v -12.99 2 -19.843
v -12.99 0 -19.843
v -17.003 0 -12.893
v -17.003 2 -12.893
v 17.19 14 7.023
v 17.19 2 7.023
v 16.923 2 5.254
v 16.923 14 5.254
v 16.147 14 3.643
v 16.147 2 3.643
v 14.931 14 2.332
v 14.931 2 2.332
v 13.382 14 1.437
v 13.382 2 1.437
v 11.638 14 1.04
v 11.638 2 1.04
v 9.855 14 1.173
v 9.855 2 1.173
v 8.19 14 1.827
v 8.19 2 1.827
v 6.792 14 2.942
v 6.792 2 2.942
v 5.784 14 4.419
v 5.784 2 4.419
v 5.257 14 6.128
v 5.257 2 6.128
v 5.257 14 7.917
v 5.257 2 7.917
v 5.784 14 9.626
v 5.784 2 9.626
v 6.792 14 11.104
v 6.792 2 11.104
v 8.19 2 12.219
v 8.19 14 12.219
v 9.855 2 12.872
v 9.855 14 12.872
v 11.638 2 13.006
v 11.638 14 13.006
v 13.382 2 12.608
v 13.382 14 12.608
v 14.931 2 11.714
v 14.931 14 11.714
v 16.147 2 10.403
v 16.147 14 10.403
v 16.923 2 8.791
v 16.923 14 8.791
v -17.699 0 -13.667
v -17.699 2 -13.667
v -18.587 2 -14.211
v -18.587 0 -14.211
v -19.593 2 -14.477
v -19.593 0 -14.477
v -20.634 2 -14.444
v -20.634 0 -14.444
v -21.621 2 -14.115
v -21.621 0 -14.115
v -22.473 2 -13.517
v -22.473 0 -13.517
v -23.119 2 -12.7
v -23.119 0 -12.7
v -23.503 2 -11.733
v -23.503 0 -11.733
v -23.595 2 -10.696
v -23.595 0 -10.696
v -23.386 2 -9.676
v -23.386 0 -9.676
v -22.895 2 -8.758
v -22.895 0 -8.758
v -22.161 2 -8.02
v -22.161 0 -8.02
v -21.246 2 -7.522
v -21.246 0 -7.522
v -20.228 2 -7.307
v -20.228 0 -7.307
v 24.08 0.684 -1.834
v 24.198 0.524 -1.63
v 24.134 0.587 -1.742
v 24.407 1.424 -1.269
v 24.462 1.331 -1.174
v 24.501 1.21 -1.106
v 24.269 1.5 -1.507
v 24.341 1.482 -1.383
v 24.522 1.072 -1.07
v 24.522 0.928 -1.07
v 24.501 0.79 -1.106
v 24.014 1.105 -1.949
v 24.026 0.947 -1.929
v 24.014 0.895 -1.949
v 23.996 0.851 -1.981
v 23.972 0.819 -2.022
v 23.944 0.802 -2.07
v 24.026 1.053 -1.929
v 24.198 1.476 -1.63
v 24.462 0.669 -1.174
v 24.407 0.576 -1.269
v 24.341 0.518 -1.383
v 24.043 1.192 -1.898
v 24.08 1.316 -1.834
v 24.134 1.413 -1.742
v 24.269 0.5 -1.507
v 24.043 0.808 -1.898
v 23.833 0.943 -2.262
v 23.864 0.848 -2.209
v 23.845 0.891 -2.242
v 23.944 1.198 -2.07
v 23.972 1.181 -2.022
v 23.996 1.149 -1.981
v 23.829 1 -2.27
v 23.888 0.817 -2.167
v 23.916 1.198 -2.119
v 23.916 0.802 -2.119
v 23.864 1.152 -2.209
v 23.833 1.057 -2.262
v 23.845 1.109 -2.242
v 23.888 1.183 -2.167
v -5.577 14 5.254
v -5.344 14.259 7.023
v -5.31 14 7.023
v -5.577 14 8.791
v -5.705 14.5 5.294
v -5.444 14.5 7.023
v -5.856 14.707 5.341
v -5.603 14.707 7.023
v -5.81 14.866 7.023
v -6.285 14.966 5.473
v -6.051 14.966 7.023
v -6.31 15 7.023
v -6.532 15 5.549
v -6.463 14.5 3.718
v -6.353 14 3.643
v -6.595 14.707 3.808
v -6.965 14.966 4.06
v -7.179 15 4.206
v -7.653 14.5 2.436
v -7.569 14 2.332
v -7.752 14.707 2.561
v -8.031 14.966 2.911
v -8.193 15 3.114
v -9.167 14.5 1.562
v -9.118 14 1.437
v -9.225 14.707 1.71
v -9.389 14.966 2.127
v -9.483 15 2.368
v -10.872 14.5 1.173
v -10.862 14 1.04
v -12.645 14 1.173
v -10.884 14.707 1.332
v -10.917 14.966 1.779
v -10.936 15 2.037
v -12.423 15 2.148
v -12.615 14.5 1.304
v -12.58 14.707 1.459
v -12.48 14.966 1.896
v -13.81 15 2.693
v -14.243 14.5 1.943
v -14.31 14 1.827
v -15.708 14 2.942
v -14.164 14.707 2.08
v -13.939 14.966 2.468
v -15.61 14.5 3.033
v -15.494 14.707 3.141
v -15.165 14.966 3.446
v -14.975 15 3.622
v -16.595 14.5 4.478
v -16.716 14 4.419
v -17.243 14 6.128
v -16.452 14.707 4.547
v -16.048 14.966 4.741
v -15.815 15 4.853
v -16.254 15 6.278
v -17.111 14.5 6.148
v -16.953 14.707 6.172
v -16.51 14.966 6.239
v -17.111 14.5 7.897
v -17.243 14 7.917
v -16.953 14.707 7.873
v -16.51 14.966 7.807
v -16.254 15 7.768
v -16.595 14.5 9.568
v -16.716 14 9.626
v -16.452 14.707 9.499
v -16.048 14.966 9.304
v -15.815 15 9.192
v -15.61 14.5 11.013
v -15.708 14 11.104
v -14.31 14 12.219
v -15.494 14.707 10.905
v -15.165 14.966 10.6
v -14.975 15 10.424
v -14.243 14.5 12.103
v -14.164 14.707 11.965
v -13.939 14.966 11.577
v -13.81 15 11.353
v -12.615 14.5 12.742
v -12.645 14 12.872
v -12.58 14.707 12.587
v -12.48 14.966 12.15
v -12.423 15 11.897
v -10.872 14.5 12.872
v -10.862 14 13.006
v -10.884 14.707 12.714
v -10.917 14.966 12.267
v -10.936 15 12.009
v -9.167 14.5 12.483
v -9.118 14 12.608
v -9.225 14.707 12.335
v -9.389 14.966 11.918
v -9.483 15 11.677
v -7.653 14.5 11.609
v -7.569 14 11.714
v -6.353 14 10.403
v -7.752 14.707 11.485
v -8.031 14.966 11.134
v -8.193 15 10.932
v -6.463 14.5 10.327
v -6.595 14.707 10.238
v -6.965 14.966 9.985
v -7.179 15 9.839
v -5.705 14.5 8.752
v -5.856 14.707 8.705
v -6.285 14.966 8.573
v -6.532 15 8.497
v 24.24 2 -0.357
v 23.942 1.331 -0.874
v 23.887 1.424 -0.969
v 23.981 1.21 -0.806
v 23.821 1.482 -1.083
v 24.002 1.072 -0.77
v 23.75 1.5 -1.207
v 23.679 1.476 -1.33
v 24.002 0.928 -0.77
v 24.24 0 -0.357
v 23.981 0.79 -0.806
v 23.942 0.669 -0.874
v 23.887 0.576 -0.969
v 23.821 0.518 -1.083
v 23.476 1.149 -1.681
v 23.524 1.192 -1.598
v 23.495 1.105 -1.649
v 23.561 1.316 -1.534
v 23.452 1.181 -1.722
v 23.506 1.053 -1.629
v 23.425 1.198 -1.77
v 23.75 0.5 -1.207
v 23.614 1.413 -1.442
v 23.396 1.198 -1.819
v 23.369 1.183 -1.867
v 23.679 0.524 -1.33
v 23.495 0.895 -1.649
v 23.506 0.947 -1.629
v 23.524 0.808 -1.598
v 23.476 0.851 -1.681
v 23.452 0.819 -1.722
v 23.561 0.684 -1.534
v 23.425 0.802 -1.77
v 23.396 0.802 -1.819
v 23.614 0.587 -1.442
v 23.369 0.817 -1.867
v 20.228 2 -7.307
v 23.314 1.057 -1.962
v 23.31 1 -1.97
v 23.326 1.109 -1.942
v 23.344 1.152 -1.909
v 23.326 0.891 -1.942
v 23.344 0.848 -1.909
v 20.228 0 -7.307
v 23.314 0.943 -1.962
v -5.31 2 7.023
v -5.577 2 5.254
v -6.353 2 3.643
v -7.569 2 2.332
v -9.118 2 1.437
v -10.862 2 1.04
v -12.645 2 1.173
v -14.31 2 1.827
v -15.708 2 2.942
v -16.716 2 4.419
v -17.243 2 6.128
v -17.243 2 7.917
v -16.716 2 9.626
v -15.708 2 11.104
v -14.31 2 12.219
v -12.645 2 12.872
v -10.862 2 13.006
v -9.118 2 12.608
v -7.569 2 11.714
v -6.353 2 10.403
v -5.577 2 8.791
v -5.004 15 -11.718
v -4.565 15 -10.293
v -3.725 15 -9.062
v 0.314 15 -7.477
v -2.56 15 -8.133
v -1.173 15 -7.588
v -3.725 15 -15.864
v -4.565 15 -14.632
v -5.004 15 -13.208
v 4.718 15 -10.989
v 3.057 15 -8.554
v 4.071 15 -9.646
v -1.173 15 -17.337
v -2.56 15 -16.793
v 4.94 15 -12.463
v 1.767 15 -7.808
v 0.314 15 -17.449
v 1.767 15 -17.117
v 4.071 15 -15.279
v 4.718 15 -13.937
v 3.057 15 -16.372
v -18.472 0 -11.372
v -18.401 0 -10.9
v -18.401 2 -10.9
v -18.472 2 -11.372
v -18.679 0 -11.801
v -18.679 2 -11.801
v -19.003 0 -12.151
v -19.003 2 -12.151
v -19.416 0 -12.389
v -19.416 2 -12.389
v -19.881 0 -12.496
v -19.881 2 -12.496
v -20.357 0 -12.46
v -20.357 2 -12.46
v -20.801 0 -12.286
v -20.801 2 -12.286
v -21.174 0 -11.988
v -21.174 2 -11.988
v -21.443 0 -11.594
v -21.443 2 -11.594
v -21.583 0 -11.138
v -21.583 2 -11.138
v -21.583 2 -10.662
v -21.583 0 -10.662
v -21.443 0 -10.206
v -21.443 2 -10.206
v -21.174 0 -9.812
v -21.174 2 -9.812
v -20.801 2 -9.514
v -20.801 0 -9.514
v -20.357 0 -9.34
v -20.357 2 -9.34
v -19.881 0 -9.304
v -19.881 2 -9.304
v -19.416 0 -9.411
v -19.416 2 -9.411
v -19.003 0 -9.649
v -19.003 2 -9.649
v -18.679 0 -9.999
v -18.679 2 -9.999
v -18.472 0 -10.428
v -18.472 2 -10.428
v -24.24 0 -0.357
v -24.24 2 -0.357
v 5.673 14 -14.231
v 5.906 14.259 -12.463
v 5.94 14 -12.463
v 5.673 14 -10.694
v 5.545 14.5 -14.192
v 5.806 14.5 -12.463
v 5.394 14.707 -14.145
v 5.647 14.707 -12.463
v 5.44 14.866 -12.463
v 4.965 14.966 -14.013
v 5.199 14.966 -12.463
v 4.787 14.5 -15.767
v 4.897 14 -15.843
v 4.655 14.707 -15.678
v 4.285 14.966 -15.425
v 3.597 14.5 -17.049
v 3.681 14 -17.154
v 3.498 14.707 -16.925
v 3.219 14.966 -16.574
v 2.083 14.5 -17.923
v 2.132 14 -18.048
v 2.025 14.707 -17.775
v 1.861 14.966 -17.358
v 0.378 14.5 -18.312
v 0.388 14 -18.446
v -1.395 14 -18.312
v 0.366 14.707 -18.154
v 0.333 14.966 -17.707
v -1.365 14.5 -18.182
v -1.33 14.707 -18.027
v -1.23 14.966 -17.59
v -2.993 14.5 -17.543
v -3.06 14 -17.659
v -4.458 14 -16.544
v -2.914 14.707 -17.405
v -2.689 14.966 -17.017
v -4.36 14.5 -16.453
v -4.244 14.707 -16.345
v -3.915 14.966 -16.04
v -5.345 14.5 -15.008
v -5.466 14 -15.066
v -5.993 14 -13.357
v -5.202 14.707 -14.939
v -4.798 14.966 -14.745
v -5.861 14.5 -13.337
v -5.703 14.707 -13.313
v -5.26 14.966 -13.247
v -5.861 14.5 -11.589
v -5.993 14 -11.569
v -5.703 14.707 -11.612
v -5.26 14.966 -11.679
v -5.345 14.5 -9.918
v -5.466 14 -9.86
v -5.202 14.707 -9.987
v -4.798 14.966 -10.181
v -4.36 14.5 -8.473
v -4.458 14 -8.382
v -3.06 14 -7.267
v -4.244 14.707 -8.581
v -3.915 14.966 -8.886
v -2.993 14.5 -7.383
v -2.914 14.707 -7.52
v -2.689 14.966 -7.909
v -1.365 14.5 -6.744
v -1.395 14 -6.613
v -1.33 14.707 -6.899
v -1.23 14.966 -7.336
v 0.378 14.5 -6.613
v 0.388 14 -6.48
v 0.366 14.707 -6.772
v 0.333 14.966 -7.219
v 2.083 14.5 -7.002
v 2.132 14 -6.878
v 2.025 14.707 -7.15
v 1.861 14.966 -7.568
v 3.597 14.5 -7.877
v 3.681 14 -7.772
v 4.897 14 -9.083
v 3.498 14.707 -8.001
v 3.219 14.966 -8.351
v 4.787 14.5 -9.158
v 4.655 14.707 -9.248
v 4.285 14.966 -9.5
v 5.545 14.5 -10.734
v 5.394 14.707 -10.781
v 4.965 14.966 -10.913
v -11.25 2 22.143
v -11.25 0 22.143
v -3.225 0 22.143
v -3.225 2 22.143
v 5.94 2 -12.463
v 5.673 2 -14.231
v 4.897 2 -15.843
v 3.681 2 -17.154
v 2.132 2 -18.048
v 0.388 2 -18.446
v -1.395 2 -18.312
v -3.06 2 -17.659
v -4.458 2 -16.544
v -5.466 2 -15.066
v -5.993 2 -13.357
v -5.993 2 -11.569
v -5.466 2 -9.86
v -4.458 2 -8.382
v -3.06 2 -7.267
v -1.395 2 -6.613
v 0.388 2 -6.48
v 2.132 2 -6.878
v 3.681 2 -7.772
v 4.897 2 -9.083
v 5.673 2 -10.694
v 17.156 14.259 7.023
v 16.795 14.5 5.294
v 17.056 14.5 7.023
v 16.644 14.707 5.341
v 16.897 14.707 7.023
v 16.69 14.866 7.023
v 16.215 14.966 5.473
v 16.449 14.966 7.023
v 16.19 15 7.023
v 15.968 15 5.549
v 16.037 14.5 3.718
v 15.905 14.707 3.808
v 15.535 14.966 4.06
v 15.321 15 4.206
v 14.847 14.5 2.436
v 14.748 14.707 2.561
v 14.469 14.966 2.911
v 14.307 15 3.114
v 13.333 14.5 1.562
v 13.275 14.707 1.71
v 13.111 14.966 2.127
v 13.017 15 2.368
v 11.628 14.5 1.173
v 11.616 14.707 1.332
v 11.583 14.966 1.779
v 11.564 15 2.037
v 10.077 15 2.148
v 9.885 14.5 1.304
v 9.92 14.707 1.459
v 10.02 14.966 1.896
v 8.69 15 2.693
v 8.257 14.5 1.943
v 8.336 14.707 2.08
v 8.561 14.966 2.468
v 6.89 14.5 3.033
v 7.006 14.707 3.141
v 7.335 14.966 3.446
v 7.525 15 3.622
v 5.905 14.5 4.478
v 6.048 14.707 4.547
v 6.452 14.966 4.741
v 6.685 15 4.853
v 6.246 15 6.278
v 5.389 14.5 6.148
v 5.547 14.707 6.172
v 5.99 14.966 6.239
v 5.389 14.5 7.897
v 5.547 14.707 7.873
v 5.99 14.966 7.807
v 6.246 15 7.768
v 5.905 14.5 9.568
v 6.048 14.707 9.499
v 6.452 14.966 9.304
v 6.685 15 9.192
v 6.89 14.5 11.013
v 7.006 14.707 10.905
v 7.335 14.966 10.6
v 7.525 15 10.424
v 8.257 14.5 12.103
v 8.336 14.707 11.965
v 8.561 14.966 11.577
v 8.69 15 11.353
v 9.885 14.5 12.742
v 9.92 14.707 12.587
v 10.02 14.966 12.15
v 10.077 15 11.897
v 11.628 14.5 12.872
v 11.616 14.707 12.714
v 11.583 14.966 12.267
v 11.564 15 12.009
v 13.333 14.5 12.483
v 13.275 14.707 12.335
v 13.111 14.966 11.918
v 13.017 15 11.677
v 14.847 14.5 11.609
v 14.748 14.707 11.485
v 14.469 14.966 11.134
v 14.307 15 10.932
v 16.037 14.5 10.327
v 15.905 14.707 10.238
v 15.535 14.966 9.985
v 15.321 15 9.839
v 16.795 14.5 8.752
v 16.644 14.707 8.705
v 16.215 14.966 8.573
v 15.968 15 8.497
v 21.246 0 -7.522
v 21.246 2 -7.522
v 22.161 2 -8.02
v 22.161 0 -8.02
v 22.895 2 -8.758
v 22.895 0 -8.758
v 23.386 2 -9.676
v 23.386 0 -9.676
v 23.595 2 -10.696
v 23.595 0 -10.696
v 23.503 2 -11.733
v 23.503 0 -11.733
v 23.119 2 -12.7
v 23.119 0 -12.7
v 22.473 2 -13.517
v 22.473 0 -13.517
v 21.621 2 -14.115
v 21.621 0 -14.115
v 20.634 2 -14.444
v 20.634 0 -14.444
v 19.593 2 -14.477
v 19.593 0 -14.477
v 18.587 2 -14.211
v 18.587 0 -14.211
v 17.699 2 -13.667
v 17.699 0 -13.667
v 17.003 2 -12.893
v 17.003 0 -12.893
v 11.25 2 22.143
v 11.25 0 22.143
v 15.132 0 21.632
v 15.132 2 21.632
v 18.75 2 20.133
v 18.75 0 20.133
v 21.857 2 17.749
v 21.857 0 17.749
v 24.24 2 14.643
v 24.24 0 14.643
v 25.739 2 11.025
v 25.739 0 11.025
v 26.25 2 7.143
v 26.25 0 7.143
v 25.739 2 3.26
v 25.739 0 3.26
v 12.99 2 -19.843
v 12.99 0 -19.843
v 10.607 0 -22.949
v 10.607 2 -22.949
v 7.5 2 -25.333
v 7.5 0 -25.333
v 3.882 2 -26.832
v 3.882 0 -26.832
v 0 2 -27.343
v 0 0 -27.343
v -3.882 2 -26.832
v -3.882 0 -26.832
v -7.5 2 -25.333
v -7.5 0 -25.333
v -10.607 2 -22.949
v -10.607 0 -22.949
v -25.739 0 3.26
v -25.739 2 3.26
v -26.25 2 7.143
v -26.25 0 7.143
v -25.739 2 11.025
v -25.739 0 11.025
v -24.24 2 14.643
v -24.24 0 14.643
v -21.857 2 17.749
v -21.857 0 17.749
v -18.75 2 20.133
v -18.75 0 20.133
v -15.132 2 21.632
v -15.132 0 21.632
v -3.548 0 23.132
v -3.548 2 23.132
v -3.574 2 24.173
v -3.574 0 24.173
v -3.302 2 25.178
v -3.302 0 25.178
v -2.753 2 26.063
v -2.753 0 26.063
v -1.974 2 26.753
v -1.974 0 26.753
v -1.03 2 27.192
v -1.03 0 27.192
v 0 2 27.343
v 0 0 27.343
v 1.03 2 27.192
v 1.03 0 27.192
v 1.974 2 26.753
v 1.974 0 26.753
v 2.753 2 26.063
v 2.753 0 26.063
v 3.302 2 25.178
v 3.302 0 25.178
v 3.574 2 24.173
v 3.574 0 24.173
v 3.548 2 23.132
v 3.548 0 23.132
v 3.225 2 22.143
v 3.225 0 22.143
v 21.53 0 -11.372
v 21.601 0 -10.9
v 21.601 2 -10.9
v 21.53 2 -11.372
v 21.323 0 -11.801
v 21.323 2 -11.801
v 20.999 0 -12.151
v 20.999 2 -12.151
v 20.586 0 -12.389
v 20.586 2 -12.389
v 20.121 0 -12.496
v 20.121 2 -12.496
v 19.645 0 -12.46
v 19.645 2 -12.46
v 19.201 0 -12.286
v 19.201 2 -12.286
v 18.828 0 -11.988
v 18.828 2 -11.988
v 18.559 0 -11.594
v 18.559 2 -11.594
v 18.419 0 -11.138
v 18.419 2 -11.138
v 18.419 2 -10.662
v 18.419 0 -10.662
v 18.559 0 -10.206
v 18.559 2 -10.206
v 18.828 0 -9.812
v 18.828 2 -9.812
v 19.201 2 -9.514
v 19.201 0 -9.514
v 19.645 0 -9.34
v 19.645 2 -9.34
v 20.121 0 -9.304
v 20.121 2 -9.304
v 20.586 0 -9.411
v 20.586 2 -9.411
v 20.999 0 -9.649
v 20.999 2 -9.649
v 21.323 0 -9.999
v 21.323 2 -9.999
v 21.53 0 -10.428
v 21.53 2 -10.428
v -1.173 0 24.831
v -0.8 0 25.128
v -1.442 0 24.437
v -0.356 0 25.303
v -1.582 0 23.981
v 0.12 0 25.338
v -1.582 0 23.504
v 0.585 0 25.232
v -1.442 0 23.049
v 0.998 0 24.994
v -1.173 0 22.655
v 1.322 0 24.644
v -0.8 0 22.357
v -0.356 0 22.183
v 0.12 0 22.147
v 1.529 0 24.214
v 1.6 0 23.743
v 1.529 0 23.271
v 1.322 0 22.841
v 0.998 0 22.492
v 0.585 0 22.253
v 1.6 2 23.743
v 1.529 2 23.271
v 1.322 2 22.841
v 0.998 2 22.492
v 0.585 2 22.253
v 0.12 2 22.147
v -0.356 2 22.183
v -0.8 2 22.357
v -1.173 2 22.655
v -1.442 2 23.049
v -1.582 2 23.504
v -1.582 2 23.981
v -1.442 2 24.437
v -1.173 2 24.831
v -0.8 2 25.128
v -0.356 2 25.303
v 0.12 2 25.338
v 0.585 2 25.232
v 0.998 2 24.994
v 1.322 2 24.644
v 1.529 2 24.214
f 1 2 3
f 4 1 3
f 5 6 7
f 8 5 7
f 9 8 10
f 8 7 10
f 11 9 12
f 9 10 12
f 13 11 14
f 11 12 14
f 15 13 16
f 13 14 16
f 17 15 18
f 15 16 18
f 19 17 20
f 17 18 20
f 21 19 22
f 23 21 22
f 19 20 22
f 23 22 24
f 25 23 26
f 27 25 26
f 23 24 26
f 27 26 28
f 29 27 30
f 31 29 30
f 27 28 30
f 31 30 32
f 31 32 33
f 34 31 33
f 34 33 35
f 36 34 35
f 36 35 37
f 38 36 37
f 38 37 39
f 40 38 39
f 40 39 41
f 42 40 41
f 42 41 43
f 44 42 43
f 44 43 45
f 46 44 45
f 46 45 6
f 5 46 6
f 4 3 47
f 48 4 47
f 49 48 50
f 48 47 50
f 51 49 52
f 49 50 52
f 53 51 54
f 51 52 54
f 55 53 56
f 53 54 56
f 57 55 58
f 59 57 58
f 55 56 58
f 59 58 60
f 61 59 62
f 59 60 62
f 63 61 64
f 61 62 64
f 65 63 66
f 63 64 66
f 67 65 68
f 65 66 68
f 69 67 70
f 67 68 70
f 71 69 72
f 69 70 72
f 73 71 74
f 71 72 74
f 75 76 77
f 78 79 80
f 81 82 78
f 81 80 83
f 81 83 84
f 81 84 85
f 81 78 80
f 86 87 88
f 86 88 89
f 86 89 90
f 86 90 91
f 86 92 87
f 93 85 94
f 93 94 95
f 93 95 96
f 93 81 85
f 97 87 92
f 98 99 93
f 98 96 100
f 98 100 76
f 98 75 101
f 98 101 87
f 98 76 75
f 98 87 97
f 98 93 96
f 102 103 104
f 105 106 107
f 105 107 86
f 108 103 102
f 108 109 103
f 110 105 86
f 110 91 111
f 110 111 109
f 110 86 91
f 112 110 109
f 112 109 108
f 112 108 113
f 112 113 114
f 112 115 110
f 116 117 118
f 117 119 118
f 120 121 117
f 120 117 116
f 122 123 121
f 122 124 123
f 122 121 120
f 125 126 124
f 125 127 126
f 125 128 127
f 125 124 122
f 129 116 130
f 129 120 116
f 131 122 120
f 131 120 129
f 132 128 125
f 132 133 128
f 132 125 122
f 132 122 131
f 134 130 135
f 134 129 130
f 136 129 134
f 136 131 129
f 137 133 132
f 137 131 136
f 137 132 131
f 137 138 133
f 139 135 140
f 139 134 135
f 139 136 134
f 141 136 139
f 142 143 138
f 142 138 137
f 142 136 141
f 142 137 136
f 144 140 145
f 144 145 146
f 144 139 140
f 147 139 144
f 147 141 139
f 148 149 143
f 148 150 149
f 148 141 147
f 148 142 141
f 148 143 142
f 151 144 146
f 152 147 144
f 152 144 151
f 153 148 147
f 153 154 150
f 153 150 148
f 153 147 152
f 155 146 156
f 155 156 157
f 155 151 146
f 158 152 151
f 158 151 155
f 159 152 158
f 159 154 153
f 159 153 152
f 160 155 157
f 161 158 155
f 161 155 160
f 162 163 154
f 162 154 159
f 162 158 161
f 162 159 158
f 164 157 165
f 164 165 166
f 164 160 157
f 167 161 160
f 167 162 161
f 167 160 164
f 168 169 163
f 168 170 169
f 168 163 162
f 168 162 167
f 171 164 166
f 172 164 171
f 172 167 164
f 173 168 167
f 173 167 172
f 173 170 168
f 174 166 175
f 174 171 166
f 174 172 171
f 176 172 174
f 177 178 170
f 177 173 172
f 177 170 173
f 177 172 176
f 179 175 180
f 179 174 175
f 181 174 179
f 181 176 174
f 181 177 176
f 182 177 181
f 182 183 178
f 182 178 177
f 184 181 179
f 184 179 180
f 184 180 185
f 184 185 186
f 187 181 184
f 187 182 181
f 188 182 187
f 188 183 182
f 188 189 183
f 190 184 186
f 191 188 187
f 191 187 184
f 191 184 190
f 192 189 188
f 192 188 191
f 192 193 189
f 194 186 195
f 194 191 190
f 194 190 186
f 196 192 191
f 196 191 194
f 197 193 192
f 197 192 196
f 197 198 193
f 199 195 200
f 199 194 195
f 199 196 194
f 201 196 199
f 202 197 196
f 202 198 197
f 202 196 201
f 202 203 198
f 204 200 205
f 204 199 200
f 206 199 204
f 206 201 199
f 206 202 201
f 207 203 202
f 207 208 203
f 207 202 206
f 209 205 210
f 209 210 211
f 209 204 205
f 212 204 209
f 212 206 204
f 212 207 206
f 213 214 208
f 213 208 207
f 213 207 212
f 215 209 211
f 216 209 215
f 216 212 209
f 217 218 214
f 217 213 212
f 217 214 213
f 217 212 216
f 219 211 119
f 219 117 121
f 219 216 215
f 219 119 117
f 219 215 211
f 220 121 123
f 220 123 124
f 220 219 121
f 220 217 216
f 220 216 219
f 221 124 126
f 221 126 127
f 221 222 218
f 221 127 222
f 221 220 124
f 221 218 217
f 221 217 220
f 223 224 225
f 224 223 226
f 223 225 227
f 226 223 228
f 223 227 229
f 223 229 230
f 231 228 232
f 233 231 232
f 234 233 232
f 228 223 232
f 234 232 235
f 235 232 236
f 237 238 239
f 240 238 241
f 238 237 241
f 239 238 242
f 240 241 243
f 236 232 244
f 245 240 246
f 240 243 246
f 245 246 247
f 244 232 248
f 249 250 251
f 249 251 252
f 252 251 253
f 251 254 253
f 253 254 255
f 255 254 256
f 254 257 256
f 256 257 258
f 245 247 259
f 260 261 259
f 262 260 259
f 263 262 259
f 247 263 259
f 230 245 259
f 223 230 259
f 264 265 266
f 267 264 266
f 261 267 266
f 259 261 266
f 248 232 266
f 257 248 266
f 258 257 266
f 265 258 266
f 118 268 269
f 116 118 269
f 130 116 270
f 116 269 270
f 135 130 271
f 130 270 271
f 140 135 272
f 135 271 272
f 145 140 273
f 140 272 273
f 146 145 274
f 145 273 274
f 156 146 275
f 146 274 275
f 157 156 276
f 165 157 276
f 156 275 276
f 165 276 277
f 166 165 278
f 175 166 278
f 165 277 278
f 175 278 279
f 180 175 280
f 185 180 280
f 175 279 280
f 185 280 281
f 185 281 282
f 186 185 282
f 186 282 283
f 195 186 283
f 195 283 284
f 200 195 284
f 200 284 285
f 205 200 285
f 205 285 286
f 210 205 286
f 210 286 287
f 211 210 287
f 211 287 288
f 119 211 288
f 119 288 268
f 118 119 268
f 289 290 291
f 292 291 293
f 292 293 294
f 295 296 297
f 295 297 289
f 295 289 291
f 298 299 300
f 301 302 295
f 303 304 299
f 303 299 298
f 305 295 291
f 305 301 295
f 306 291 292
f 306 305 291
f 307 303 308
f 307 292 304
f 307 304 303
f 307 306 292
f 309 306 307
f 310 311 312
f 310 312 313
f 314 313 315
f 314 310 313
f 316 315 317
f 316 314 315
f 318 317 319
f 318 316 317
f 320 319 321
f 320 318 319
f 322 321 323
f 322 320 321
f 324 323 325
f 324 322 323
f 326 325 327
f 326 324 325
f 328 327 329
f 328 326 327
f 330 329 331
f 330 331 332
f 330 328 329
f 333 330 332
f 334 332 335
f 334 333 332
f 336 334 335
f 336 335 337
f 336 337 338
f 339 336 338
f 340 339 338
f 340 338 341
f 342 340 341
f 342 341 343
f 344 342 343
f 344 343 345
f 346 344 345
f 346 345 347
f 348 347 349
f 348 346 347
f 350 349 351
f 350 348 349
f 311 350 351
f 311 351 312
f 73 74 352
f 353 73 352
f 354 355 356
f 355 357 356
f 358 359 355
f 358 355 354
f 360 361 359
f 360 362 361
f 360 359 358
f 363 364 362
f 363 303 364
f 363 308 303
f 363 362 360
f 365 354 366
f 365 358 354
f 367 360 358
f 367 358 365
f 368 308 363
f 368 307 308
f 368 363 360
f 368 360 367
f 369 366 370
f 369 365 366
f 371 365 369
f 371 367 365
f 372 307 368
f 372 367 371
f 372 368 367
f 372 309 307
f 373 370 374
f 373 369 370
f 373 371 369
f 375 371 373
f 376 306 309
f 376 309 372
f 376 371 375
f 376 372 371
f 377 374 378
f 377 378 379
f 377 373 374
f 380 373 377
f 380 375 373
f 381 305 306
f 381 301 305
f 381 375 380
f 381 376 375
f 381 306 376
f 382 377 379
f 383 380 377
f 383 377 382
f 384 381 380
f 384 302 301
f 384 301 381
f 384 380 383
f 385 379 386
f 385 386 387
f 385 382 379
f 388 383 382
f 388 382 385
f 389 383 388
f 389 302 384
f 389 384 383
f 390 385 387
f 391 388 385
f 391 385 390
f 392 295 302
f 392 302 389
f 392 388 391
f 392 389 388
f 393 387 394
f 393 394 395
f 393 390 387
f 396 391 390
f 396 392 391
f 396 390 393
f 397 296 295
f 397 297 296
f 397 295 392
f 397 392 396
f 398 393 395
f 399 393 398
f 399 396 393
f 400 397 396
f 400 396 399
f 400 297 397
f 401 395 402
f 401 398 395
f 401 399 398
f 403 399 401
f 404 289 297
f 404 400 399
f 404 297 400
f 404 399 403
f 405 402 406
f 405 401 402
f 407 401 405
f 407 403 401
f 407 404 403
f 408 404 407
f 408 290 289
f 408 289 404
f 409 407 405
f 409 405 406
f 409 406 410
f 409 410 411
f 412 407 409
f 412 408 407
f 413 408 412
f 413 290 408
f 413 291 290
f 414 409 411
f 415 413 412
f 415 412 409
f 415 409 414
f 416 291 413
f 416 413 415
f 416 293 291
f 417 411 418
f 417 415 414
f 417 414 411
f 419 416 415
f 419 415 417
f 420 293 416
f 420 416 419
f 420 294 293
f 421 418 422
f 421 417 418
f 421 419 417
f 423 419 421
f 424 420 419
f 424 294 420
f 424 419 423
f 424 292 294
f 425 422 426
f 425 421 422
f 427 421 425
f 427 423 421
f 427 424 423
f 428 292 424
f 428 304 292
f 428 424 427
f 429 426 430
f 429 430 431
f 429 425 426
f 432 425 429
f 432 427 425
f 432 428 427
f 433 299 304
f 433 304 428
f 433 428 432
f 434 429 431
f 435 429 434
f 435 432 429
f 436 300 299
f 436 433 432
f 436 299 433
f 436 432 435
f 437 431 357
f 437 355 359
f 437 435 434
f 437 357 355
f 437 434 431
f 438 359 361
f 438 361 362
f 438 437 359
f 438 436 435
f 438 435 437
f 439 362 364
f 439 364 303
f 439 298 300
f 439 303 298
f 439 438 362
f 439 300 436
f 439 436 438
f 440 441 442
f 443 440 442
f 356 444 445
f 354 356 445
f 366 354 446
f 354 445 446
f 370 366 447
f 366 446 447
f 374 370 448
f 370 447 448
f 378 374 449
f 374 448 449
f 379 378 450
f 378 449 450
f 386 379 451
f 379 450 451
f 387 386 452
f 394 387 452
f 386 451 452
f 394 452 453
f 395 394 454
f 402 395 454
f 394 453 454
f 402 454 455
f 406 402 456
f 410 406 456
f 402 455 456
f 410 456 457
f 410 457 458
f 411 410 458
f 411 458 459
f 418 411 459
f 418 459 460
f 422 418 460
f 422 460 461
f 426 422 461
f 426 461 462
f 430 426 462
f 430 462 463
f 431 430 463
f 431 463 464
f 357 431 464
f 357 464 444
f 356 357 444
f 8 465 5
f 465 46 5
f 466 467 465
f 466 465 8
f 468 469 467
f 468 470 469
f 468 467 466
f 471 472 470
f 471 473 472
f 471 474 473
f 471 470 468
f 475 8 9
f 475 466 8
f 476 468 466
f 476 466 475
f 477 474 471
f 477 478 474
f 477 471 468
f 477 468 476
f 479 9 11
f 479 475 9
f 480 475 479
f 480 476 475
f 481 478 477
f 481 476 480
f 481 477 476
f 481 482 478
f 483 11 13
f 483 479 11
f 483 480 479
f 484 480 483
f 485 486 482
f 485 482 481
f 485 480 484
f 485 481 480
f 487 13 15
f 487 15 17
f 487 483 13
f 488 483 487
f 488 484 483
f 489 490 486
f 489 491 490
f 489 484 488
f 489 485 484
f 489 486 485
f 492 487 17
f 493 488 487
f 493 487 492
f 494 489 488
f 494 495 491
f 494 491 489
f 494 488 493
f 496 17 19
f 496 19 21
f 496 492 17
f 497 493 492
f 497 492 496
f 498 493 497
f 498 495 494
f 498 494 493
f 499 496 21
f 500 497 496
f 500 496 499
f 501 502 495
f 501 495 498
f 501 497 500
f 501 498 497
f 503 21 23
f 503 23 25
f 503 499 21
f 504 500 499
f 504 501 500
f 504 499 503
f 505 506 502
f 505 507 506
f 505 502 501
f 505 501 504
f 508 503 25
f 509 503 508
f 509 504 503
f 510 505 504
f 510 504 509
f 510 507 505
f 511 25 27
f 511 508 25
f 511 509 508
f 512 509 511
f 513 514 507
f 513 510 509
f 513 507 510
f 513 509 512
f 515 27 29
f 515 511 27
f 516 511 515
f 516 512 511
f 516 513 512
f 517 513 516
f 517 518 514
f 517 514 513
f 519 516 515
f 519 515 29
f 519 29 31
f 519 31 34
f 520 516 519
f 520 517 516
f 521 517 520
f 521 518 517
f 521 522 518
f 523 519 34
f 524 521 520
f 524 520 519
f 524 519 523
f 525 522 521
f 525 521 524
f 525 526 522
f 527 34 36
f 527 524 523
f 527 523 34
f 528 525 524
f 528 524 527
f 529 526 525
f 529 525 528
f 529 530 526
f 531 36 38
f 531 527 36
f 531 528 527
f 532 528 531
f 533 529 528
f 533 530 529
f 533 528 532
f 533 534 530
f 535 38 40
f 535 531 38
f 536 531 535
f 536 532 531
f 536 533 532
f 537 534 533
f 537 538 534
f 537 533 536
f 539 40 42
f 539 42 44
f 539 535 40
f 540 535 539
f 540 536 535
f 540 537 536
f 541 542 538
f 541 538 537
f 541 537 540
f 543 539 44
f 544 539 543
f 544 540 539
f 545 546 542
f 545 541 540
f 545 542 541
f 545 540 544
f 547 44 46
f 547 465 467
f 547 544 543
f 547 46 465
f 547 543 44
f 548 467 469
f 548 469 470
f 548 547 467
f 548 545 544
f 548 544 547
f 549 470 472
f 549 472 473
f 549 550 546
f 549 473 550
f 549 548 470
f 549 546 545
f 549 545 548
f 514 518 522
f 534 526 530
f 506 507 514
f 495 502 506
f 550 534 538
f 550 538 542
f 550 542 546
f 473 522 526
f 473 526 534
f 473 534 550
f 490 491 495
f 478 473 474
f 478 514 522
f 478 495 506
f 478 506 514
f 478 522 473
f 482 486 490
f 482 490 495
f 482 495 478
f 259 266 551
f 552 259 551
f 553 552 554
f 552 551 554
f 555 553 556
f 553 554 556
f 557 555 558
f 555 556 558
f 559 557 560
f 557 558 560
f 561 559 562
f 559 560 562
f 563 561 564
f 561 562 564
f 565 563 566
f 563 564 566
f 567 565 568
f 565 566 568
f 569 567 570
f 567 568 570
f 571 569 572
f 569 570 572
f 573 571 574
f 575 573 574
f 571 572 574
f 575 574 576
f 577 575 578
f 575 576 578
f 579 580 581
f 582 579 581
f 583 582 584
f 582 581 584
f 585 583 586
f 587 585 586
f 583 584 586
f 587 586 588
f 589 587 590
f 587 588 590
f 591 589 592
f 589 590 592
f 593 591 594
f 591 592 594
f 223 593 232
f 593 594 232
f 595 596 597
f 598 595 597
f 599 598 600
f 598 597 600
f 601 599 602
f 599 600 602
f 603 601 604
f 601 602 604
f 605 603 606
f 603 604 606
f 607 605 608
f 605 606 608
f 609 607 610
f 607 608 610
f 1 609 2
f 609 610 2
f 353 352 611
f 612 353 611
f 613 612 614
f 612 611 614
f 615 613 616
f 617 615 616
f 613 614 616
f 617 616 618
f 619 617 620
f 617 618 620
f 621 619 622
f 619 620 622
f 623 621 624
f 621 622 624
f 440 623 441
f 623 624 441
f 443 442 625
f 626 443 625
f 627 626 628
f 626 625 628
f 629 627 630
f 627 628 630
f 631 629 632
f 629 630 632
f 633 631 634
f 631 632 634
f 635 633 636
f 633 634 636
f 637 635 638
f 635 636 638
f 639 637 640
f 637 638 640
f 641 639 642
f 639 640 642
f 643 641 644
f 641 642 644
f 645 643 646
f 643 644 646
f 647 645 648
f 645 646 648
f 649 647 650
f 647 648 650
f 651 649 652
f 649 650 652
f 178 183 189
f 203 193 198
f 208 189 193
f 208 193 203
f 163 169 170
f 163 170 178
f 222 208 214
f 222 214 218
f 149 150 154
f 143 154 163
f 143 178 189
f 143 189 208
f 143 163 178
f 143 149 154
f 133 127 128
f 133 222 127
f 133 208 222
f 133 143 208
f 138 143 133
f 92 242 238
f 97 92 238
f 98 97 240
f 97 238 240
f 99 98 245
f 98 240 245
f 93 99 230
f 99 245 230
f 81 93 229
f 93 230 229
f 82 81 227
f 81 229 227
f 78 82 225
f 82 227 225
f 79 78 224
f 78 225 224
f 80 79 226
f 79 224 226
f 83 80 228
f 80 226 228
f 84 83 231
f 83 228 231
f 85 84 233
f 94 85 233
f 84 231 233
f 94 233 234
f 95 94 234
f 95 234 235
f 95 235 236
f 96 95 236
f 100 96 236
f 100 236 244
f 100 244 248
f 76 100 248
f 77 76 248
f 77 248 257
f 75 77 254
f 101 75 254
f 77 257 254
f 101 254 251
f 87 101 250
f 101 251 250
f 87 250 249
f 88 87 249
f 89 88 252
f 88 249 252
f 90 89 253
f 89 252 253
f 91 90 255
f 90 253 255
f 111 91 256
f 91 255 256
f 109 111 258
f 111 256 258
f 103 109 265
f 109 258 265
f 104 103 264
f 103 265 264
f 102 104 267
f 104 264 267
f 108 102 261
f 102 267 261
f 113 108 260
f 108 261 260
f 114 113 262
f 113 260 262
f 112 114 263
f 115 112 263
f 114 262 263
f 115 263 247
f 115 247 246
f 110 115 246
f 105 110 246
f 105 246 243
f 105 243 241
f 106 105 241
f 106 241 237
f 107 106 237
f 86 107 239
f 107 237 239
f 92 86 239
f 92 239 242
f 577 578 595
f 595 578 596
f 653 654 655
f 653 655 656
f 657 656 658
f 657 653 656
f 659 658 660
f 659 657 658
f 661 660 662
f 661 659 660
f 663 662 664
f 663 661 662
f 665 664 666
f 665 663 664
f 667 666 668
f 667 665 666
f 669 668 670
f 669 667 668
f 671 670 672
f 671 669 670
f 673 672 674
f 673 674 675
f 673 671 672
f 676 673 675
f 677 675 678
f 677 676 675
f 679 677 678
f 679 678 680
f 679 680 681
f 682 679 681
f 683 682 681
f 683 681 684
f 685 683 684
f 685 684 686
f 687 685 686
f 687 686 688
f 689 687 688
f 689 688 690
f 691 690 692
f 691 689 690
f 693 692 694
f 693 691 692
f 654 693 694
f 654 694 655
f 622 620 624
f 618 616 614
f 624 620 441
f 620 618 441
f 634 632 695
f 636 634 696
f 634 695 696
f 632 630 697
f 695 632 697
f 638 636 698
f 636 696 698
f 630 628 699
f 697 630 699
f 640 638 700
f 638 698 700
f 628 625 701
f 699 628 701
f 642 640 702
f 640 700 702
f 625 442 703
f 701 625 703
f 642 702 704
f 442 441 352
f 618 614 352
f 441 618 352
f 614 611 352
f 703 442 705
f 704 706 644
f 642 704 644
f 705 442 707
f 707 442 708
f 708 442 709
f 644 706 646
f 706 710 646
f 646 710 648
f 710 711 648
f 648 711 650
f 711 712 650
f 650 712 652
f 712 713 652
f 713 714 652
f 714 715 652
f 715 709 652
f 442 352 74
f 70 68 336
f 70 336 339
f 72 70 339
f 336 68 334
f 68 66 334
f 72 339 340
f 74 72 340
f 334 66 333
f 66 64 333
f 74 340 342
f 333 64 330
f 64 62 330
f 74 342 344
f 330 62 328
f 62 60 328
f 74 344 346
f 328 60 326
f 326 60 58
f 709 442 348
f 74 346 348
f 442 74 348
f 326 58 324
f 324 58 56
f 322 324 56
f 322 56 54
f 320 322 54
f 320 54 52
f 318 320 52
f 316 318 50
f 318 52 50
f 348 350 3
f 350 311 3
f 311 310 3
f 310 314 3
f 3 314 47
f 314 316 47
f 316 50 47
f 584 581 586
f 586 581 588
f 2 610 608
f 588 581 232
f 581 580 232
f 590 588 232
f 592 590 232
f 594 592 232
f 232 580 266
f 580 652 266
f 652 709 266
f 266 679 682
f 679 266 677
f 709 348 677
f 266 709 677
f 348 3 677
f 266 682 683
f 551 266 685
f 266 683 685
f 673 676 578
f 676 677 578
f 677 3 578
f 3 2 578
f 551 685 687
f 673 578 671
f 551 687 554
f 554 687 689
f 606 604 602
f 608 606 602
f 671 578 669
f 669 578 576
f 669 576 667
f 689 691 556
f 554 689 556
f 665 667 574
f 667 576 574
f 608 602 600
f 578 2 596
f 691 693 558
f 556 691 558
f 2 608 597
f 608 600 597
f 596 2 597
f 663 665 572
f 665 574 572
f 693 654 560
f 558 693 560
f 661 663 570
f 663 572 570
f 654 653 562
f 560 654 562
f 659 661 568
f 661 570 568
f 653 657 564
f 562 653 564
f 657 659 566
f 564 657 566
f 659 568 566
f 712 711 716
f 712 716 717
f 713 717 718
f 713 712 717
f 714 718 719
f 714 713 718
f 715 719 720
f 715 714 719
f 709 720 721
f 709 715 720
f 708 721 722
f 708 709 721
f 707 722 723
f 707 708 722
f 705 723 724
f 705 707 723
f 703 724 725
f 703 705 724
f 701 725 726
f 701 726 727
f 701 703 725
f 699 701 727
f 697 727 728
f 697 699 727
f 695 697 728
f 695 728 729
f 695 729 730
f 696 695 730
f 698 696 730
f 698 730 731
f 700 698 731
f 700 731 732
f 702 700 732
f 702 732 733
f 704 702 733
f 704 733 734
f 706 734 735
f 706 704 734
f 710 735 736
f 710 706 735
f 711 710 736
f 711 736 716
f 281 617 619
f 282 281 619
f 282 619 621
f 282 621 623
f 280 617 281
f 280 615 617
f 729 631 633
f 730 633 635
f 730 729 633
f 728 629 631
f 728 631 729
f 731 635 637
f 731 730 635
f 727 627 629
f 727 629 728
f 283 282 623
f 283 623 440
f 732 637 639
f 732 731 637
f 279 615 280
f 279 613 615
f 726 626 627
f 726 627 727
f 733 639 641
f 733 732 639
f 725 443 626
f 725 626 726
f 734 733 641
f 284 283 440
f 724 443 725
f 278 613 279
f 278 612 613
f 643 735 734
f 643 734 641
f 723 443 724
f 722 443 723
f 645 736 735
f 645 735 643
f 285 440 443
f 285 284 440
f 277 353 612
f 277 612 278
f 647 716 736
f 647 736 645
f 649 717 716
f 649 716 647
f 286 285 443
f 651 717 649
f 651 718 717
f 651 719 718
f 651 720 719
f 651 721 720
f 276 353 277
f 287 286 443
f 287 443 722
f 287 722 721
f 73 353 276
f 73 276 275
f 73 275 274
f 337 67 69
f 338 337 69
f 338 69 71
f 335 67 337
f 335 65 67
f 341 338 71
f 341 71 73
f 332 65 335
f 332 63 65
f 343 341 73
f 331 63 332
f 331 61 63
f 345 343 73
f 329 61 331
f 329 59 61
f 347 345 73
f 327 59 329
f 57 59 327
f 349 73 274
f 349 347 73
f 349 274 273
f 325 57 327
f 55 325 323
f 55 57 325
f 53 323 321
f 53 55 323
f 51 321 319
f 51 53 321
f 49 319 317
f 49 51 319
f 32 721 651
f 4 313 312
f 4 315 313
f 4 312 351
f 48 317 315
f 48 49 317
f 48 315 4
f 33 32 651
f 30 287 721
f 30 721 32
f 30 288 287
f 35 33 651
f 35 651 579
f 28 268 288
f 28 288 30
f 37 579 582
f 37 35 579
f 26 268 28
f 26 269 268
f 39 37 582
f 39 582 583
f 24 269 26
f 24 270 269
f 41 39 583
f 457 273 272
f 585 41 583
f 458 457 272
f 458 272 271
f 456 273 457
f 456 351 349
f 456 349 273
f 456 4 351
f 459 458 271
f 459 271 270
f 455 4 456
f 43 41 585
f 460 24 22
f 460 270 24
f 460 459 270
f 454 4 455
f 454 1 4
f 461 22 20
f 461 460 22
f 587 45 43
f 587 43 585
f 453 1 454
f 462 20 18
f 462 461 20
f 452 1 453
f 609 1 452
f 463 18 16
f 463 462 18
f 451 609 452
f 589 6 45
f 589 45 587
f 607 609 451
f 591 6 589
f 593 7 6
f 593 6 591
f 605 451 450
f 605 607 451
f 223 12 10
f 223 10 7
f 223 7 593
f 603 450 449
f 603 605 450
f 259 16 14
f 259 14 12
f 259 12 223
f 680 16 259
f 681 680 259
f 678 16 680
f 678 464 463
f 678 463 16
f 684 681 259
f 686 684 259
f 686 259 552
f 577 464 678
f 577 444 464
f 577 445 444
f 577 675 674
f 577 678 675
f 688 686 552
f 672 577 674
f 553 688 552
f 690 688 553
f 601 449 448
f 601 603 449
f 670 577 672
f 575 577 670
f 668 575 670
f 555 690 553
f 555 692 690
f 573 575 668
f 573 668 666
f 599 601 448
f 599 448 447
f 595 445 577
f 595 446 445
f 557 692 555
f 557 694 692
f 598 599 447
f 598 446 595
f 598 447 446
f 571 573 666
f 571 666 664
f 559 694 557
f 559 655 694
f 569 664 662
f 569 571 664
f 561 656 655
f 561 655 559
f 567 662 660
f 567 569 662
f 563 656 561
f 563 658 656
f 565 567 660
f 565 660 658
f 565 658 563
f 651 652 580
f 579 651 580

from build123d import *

# Parameters (mm, degrees)
SKETCH5_R           = 1.6
BOSS_EXTRUDE2_DEPTH = 2
SKETCH6_R           = 6
BOSS_EXTRUDE3_DEPTH = 15
FILLET1_R           = 1
BOSS_EXTRUDE5_DEPTH = 0.6


with BuildPart() as part:
    # Sketch5 → Boss-Extrude2 (new body)
    with BuildSketch(Plane(origin=(0, 0, 0), x_dir=(1, 0, 0), z_dir=(0, 1, 0))):
        with BuildLine():
            Line((-11.250000051, -22.142785594), (-3.22490315, -22.142785594))
            ThreePointArc((-3.22490315, -22.142785594), (-5.1e-08, -27.342785594), (3.224903048, -22.142785594))
            Line((3.224903048, -22.142785594), (11.249999949, -22.142785594))
            ThreePointArc((11.249999949, -22.142785594), (24.240381006, -14.642785594), (24.240381006, 0.357214406))
            Line((24.240381006, 0.357214406), (20.227832555, 7.30715219))
            ThreePointArc((20.227832555, 7.30715219), (23.118713105, 12.700000199), (17.002929456, 12.892848208))
            Line((17.002929456, 12.892848208), (12.990381006, 19.842785992))
            ThreePointArc((12.990381006, 19.842785992), (-5.1e-08, 27.342785992), (-12.990381108, 19.842785992))
            Line((-12.990381108, 19.842785992), (-17.002929558, 12.892848208))
            ThreePointArc((-17.002929558, 12.892848208), (-23.118713208, 12.700000199), (-20.227832658, 7.30715219))
            Line((-20.227832658, 7.30715219), (-24.240381108, 0.357214406))
            ThreePointArc((-24.240381108, 0.357214406), (-24.240381108, -14.642785594), (-11.250000051, -22.142785594))
        make_face()
        with Locations((20.001021652, 10.900000199)):
            Circle(SKETCH5_R, mode=Mode.SUBTRACT)
        with Locations((-5.1e-08, -23.742785594)):
            Circle(SKETCH5_R, mode=Mode.SUBTRACT)
        with Locations((-20.001021754, 10.900000199)):
            Circle(SKETCH5_R, mode=Mode.SUBTRACT)
    extrude(amount=BOSS_EXTRUDE2_DEPTH)

    # Sketch6 → Boss-Extrude3 (add)
    with BuildSketch(Plane(origin=(0, 0, 0), x_dir=(1, 0, 0), z_dir=(0, 1, 0))):
        with Locations((-0.060025126, 12.462836141)):
            Circle(SKETCH6_R)
        with Locations((11.189974874, -7.022735444)):
            Circle(SKETCH6_R)
        with Locations((-11.310025126, -7.022735444)):
            Circle(SKETCH6_R)
    extrude(amount=BOSS_EXTRUDE3_DEPTH)

    # Fillet1
    fillet1_edges = [part.edges().sort_by_distance(p)[0] for p in [
        (-6.060025126, 15, -12.462836141),
        (5.189974874, 15, 7.022735444),
        (-17.310025126, 15, 7.022735444),
    ]]
    fillet(fillet1_edges, radius=FILLET1_R)

    # Sketch7 → Boss-Extrude5 (add)
    with BuildSketch(Plane(origin=(18.334964129, 0, -10.585696476), x_dir=(-0.5, 0, -0.866025404), z_dir=(0.866025404, 0, -0.5))):
        with BuildLine():
            ThreePointArc((-10.342014969, 1.052839651), (-11.339215101, 1), (-10.342014969, 0.947160349))
            ThreePointArc((-10.342014969, 0.947160349), (-9.94912129, 1), (-10.342014969, 1.052839651))
        make_face()
    extrude(amount=BOSS_EXTRUDE5_DEPTH)


solid = part.part
